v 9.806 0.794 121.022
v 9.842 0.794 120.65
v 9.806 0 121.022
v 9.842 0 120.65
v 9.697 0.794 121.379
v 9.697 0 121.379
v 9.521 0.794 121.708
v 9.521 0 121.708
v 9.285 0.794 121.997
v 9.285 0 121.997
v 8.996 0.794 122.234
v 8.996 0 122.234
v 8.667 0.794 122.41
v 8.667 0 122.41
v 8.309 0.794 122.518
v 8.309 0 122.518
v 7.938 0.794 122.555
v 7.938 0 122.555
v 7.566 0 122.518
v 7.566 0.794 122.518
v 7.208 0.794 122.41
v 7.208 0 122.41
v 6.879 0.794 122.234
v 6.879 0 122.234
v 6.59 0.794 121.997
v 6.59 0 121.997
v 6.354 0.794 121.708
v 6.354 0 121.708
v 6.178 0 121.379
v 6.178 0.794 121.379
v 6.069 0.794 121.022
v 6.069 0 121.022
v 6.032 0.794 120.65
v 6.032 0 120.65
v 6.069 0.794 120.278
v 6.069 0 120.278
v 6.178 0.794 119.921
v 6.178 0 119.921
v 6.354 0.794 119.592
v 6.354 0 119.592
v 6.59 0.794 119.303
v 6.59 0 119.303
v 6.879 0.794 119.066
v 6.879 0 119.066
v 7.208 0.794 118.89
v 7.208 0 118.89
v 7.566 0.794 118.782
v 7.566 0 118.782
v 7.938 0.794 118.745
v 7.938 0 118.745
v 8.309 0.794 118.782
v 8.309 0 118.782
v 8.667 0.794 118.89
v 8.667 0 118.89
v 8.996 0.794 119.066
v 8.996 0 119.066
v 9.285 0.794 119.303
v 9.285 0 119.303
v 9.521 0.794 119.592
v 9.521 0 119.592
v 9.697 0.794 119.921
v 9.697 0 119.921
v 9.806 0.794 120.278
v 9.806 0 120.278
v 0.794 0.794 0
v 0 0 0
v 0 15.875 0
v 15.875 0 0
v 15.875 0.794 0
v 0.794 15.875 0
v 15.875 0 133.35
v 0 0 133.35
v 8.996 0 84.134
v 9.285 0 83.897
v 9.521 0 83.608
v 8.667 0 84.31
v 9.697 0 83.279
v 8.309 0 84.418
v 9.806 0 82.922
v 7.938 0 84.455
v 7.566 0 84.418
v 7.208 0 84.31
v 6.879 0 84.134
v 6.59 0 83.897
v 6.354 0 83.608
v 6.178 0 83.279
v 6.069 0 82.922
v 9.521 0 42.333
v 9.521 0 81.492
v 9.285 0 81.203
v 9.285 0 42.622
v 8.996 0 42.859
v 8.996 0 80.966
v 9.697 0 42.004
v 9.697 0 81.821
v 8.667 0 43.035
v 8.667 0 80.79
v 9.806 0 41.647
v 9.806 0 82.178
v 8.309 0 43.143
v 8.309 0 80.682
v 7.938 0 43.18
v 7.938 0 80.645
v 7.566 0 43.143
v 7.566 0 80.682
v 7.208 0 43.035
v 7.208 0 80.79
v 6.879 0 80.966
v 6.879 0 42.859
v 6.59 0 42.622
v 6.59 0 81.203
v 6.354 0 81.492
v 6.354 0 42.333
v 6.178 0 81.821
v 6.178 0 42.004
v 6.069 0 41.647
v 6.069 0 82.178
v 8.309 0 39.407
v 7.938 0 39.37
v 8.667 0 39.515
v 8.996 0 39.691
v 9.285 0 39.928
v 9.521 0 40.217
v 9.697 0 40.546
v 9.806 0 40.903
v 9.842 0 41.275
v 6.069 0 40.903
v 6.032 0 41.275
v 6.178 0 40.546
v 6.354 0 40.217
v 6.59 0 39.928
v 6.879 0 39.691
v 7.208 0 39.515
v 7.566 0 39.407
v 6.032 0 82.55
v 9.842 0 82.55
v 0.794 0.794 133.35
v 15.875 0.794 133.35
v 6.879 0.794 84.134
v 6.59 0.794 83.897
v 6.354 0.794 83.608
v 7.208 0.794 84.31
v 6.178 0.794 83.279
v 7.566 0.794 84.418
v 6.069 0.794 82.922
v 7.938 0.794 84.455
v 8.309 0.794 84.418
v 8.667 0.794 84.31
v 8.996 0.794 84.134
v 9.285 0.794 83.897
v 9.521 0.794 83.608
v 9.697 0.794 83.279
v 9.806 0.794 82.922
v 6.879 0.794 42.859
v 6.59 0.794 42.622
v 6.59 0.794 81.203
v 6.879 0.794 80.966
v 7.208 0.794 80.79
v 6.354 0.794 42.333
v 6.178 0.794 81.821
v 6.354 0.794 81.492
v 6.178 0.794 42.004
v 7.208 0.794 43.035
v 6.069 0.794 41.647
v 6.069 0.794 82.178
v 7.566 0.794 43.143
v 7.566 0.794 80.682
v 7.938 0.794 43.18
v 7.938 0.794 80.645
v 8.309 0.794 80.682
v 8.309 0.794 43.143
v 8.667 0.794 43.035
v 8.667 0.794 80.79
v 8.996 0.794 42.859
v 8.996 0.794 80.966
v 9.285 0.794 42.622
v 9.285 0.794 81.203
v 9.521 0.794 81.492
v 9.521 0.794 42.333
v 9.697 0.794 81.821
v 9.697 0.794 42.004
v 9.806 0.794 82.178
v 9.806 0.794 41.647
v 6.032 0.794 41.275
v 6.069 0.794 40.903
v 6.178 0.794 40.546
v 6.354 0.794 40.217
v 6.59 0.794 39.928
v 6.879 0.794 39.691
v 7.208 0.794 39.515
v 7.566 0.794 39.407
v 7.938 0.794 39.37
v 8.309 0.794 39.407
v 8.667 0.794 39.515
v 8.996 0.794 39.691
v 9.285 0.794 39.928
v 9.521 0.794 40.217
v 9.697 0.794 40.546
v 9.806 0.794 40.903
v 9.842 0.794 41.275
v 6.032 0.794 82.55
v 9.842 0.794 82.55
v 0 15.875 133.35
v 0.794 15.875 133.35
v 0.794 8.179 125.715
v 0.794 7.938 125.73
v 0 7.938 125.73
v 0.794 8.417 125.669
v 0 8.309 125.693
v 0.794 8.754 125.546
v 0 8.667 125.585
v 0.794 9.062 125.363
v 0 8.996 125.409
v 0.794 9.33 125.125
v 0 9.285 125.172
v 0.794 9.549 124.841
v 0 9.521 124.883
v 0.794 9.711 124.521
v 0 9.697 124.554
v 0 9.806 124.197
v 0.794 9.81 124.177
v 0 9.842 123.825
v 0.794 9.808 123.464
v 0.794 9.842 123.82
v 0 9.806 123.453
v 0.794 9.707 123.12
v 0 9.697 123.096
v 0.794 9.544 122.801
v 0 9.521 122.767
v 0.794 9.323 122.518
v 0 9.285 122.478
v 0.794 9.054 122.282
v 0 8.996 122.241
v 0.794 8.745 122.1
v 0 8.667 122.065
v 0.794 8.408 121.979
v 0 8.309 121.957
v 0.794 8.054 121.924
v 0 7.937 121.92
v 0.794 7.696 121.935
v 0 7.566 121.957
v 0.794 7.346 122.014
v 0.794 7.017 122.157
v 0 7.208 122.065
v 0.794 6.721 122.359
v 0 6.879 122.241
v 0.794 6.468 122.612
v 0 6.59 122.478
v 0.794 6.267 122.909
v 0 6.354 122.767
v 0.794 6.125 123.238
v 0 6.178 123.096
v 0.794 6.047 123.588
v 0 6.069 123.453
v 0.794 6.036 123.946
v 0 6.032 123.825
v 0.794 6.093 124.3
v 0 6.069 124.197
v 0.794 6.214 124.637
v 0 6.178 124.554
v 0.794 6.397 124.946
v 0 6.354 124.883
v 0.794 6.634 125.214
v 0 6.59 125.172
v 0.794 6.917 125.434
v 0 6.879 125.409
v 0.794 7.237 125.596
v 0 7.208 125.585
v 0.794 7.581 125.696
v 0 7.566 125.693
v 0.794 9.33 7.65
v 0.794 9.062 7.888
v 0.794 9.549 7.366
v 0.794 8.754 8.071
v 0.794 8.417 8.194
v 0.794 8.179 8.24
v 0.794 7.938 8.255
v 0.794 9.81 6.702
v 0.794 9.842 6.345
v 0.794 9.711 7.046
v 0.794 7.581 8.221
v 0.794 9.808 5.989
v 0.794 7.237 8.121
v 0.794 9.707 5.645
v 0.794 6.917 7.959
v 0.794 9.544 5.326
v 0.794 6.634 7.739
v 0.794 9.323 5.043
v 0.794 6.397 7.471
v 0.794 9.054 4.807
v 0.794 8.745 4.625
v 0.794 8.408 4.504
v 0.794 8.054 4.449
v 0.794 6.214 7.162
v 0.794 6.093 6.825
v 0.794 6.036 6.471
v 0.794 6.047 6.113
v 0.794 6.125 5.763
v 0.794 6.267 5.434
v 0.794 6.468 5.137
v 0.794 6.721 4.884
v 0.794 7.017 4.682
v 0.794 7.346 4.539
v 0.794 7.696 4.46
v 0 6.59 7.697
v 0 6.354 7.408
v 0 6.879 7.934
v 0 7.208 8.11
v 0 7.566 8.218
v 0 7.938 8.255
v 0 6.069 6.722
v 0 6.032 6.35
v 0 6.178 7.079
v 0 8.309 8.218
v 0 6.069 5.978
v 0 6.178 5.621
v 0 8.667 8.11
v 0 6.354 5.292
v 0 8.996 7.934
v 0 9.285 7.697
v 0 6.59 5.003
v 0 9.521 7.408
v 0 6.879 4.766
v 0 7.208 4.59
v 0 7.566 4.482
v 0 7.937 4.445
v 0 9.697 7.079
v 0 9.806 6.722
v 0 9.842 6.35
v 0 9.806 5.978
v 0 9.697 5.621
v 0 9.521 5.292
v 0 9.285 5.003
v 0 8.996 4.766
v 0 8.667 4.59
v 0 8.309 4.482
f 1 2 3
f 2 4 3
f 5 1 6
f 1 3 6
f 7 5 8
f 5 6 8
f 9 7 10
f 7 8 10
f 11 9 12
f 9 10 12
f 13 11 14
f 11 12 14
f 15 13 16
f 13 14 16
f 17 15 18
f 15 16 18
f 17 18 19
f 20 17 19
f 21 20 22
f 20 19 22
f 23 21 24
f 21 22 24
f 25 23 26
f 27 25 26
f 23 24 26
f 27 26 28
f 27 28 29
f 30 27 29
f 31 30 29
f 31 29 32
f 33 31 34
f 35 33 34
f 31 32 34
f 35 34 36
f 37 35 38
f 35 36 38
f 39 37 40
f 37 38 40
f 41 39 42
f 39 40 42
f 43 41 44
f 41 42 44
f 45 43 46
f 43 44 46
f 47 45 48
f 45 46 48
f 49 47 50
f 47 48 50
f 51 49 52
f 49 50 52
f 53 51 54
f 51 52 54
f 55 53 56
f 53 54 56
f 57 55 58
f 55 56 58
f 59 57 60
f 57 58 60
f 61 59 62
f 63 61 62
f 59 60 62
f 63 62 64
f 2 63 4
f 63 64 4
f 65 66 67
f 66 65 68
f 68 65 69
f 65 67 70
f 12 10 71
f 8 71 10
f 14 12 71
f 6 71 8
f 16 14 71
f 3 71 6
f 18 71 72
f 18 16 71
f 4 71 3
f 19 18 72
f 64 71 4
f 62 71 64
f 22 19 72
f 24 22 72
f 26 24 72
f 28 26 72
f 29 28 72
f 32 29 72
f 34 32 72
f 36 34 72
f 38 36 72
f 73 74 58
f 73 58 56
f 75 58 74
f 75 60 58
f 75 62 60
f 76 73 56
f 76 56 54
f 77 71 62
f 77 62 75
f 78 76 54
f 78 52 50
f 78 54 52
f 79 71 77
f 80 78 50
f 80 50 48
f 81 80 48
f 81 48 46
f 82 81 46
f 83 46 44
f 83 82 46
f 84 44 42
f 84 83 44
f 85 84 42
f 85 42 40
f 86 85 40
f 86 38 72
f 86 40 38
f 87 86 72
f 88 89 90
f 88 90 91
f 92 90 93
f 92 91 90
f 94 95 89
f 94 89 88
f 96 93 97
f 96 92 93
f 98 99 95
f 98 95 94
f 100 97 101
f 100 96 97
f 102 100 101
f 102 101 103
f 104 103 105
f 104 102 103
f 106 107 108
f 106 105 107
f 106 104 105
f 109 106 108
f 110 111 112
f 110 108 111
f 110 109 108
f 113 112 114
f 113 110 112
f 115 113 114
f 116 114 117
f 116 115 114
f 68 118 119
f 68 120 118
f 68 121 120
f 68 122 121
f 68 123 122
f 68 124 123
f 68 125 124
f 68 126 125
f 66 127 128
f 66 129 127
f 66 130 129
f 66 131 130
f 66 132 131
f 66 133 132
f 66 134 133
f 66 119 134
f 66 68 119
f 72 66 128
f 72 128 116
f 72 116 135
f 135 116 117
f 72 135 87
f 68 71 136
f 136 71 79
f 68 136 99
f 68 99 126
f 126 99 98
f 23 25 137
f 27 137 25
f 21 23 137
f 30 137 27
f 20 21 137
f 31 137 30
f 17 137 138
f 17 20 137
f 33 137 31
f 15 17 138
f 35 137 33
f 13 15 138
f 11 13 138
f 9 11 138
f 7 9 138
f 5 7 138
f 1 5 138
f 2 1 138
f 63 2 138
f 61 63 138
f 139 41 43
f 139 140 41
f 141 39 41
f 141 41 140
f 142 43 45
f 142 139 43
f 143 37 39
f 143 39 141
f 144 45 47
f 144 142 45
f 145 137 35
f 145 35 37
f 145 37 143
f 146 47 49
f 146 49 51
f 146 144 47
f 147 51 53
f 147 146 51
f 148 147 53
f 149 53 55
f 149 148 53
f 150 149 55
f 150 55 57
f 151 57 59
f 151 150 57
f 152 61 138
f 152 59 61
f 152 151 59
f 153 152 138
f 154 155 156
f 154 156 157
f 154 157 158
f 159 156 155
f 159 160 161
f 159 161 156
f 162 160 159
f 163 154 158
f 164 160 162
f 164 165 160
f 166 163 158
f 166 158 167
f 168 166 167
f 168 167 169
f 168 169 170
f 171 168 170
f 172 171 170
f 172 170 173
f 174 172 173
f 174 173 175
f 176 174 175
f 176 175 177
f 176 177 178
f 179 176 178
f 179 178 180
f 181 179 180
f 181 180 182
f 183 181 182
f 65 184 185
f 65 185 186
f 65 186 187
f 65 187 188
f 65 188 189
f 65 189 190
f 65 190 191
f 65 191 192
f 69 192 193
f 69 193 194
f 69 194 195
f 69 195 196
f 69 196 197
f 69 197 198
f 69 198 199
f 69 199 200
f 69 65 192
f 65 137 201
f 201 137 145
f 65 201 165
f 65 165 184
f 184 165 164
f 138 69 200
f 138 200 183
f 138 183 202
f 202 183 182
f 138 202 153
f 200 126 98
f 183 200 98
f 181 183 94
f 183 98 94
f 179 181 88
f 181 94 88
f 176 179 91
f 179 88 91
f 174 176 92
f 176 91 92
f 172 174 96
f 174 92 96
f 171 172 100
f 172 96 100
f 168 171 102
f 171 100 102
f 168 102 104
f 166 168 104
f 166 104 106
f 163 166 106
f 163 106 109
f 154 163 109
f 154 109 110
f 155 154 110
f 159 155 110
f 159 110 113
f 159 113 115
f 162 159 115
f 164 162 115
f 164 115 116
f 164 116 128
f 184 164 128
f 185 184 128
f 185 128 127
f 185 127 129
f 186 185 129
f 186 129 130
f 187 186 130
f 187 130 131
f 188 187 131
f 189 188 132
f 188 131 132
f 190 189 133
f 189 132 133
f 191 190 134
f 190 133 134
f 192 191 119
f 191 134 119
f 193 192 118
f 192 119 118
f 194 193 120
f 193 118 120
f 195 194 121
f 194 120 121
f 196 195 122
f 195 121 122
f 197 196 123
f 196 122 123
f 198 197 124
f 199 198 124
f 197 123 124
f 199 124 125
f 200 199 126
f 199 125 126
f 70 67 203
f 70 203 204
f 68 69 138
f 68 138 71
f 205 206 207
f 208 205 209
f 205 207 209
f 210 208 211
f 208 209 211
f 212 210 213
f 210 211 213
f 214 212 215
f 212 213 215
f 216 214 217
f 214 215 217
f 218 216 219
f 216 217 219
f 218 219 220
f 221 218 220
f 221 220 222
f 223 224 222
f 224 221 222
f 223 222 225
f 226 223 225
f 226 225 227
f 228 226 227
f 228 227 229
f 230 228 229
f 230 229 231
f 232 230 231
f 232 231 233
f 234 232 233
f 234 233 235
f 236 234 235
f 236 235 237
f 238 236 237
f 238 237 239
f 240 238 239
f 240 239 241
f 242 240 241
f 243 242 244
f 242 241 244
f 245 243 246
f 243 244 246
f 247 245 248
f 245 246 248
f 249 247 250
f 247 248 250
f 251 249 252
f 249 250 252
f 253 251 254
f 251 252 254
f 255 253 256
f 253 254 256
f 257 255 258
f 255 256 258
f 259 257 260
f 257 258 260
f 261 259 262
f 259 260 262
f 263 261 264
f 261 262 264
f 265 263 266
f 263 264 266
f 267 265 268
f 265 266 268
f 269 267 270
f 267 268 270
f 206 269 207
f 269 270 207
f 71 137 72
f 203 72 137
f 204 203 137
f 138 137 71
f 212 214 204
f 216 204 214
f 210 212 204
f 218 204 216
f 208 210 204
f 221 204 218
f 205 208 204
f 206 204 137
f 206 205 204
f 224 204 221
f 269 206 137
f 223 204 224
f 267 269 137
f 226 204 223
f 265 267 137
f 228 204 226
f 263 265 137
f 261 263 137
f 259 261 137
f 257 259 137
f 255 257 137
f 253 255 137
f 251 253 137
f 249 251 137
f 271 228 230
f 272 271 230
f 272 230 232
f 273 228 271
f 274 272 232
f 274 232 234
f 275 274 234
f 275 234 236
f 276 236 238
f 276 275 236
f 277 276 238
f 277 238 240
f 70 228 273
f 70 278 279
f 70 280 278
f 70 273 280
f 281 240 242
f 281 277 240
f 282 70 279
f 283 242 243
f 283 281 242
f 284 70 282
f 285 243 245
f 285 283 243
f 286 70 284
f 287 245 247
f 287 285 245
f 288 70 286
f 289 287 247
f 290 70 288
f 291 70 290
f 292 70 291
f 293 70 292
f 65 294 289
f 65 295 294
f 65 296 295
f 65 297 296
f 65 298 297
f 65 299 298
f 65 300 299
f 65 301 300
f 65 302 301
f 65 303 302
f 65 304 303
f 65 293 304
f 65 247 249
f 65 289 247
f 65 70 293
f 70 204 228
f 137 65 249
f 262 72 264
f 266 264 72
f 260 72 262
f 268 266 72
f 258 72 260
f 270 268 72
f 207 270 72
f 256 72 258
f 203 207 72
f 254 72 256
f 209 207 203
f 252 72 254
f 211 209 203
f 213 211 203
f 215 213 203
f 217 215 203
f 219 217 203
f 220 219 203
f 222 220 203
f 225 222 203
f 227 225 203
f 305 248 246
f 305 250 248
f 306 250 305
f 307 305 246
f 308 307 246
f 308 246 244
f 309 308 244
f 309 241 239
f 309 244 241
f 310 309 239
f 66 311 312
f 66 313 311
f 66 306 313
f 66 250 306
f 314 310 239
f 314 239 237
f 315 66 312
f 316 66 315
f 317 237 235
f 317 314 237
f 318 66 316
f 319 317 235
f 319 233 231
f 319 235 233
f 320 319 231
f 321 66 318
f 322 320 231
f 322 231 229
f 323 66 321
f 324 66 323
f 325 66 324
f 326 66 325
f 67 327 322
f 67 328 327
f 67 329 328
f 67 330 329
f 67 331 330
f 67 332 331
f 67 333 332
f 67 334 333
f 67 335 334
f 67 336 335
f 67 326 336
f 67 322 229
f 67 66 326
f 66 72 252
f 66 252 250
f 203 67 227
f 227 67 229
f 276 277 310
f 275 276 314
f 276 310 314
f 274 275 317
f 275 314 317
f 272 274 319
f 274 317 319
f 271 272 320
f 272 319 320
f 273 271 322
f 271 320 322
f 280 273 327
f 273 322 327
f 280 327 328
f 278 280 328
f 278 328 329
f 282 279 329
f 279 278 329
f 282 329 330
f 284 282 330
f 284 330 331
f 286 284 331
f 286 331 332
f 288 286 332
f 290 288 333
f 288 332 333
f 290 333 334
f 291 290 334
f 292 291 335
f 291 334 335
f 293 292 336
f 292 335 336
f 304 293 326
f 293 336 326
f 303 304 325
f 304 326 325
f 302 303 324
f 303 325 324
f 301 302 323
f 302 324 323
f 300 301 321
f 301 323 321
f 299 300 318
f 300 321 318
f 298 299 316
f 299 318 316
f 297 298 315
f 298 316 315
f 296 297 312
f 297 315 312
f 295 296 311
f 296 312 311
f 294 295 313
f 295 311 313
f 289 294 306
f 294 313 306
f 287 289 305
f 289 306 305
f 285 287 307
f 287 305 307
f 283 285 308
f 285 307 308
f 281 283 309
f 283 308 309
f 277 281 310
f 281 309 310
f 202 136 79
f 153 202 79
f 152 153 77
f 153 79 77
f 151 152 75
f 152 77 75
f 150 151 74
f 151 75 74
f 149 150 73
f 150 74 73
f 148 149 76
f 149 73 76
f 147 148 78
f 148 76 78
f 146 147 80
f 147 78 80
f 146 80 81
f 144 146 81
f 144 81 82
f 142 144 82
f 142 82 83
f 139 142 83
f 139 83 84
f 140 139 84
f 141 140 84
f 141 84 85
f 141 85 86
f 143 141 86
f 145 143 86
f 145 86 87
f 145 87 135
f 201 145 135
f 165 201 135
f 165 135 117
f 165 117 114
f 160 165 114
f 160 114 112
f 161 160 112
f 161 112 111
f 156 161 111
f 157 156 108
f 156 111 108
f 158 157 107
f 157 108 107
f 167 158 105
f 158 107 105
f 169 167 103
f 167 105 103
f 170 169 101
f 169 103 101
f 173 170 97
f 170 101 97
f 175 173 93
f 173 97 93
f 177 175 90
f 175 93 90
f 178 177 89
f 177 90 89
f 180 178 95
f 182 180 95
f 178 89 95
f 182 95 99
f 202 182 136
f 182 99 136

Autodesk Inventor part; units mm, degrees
ref_plane "YZ Plane" through (0, 0, 0) normal (1, 0, 0) x (0, 1, 0)
ref_plane "XZ Plane" through (0, 0, 0) normal (0, 1, 0) x (-1, 0, 0)
ref_plane "XY Plane" through (0, 0, 0) normal (0, 0, 1) x (1, 0, 0)
sketch "Sketch1" plane through (0, 0, 0) normal (0, 0, 1) x (1, 0, 0)
  line L0 (0, 0) -> (0, 15.875)
  line L1 (0, 15.875) -> (0.7937, 15.875)
  line L2 (0.7937, 15.875) -> (0.7938, 0.7937)
  line L3 (0.7938, 0.7937) -> (15.875, 0.7937)
  line L4 (15.875, 0.7937) -> (15.875, 0)
  line L5 (15.875, 0) -> (0, 0)
  dimension "d0" = 15.875
  dimension "d1" = 0.7937
extrude "Extrusion1" add sketch "Sketch1" along normal blind 133.35
sketch "Sketch2" plane through (0, 0, 0) normal (0, -1, 0) x (1, 0, 0)
  line L0 (15.875, 0) -> (0, 0) projected
  line L1 (0, 133.35) -> (15.875, 133.35) projected
  line L2 (7.9375, 133.35) -> (7.9375, 0) construction
  circle A0 centre (7.9375, 120.65) radius 1.905
  circle A1 centre (7.9375, 41.275) radius 1.905
  circle A2 centre (7.9375, 82.55) radius 1.905
  dimension "d4" = 3.81
  dimension "d6" = 12.7
  dimension "d7" = 41.275
  dimension "d16" = 38.1
extrude "Extrusion2" cut sketch "Sketch2" against normal through all
sketch "Sketch3" plane through (0, 0, 0) normal (-1, 0, 0) x (0, 0, 1)
  line L0 (0, 0) -> (0, 15.875) projected
  line L1 (133.35, 15.875) -> (133.35, 0) projected
  line L2 (0, 7.9375) -> (133.35, 7.9375) construction
  circle A0 centre (6.35, 7.9375) radius 1.905
  circle A1 centre (123.825, 7.9375) radius 1.905
  dimension "d11" = 3.81
  dimension "d12" = 9.525
  dimension "d13" = 6.35
extrude "Extrusion3" cut sketch "Sketch3" against normal through all
properties part number "Hopper Bracing P3" material "Aluminum 6061"
